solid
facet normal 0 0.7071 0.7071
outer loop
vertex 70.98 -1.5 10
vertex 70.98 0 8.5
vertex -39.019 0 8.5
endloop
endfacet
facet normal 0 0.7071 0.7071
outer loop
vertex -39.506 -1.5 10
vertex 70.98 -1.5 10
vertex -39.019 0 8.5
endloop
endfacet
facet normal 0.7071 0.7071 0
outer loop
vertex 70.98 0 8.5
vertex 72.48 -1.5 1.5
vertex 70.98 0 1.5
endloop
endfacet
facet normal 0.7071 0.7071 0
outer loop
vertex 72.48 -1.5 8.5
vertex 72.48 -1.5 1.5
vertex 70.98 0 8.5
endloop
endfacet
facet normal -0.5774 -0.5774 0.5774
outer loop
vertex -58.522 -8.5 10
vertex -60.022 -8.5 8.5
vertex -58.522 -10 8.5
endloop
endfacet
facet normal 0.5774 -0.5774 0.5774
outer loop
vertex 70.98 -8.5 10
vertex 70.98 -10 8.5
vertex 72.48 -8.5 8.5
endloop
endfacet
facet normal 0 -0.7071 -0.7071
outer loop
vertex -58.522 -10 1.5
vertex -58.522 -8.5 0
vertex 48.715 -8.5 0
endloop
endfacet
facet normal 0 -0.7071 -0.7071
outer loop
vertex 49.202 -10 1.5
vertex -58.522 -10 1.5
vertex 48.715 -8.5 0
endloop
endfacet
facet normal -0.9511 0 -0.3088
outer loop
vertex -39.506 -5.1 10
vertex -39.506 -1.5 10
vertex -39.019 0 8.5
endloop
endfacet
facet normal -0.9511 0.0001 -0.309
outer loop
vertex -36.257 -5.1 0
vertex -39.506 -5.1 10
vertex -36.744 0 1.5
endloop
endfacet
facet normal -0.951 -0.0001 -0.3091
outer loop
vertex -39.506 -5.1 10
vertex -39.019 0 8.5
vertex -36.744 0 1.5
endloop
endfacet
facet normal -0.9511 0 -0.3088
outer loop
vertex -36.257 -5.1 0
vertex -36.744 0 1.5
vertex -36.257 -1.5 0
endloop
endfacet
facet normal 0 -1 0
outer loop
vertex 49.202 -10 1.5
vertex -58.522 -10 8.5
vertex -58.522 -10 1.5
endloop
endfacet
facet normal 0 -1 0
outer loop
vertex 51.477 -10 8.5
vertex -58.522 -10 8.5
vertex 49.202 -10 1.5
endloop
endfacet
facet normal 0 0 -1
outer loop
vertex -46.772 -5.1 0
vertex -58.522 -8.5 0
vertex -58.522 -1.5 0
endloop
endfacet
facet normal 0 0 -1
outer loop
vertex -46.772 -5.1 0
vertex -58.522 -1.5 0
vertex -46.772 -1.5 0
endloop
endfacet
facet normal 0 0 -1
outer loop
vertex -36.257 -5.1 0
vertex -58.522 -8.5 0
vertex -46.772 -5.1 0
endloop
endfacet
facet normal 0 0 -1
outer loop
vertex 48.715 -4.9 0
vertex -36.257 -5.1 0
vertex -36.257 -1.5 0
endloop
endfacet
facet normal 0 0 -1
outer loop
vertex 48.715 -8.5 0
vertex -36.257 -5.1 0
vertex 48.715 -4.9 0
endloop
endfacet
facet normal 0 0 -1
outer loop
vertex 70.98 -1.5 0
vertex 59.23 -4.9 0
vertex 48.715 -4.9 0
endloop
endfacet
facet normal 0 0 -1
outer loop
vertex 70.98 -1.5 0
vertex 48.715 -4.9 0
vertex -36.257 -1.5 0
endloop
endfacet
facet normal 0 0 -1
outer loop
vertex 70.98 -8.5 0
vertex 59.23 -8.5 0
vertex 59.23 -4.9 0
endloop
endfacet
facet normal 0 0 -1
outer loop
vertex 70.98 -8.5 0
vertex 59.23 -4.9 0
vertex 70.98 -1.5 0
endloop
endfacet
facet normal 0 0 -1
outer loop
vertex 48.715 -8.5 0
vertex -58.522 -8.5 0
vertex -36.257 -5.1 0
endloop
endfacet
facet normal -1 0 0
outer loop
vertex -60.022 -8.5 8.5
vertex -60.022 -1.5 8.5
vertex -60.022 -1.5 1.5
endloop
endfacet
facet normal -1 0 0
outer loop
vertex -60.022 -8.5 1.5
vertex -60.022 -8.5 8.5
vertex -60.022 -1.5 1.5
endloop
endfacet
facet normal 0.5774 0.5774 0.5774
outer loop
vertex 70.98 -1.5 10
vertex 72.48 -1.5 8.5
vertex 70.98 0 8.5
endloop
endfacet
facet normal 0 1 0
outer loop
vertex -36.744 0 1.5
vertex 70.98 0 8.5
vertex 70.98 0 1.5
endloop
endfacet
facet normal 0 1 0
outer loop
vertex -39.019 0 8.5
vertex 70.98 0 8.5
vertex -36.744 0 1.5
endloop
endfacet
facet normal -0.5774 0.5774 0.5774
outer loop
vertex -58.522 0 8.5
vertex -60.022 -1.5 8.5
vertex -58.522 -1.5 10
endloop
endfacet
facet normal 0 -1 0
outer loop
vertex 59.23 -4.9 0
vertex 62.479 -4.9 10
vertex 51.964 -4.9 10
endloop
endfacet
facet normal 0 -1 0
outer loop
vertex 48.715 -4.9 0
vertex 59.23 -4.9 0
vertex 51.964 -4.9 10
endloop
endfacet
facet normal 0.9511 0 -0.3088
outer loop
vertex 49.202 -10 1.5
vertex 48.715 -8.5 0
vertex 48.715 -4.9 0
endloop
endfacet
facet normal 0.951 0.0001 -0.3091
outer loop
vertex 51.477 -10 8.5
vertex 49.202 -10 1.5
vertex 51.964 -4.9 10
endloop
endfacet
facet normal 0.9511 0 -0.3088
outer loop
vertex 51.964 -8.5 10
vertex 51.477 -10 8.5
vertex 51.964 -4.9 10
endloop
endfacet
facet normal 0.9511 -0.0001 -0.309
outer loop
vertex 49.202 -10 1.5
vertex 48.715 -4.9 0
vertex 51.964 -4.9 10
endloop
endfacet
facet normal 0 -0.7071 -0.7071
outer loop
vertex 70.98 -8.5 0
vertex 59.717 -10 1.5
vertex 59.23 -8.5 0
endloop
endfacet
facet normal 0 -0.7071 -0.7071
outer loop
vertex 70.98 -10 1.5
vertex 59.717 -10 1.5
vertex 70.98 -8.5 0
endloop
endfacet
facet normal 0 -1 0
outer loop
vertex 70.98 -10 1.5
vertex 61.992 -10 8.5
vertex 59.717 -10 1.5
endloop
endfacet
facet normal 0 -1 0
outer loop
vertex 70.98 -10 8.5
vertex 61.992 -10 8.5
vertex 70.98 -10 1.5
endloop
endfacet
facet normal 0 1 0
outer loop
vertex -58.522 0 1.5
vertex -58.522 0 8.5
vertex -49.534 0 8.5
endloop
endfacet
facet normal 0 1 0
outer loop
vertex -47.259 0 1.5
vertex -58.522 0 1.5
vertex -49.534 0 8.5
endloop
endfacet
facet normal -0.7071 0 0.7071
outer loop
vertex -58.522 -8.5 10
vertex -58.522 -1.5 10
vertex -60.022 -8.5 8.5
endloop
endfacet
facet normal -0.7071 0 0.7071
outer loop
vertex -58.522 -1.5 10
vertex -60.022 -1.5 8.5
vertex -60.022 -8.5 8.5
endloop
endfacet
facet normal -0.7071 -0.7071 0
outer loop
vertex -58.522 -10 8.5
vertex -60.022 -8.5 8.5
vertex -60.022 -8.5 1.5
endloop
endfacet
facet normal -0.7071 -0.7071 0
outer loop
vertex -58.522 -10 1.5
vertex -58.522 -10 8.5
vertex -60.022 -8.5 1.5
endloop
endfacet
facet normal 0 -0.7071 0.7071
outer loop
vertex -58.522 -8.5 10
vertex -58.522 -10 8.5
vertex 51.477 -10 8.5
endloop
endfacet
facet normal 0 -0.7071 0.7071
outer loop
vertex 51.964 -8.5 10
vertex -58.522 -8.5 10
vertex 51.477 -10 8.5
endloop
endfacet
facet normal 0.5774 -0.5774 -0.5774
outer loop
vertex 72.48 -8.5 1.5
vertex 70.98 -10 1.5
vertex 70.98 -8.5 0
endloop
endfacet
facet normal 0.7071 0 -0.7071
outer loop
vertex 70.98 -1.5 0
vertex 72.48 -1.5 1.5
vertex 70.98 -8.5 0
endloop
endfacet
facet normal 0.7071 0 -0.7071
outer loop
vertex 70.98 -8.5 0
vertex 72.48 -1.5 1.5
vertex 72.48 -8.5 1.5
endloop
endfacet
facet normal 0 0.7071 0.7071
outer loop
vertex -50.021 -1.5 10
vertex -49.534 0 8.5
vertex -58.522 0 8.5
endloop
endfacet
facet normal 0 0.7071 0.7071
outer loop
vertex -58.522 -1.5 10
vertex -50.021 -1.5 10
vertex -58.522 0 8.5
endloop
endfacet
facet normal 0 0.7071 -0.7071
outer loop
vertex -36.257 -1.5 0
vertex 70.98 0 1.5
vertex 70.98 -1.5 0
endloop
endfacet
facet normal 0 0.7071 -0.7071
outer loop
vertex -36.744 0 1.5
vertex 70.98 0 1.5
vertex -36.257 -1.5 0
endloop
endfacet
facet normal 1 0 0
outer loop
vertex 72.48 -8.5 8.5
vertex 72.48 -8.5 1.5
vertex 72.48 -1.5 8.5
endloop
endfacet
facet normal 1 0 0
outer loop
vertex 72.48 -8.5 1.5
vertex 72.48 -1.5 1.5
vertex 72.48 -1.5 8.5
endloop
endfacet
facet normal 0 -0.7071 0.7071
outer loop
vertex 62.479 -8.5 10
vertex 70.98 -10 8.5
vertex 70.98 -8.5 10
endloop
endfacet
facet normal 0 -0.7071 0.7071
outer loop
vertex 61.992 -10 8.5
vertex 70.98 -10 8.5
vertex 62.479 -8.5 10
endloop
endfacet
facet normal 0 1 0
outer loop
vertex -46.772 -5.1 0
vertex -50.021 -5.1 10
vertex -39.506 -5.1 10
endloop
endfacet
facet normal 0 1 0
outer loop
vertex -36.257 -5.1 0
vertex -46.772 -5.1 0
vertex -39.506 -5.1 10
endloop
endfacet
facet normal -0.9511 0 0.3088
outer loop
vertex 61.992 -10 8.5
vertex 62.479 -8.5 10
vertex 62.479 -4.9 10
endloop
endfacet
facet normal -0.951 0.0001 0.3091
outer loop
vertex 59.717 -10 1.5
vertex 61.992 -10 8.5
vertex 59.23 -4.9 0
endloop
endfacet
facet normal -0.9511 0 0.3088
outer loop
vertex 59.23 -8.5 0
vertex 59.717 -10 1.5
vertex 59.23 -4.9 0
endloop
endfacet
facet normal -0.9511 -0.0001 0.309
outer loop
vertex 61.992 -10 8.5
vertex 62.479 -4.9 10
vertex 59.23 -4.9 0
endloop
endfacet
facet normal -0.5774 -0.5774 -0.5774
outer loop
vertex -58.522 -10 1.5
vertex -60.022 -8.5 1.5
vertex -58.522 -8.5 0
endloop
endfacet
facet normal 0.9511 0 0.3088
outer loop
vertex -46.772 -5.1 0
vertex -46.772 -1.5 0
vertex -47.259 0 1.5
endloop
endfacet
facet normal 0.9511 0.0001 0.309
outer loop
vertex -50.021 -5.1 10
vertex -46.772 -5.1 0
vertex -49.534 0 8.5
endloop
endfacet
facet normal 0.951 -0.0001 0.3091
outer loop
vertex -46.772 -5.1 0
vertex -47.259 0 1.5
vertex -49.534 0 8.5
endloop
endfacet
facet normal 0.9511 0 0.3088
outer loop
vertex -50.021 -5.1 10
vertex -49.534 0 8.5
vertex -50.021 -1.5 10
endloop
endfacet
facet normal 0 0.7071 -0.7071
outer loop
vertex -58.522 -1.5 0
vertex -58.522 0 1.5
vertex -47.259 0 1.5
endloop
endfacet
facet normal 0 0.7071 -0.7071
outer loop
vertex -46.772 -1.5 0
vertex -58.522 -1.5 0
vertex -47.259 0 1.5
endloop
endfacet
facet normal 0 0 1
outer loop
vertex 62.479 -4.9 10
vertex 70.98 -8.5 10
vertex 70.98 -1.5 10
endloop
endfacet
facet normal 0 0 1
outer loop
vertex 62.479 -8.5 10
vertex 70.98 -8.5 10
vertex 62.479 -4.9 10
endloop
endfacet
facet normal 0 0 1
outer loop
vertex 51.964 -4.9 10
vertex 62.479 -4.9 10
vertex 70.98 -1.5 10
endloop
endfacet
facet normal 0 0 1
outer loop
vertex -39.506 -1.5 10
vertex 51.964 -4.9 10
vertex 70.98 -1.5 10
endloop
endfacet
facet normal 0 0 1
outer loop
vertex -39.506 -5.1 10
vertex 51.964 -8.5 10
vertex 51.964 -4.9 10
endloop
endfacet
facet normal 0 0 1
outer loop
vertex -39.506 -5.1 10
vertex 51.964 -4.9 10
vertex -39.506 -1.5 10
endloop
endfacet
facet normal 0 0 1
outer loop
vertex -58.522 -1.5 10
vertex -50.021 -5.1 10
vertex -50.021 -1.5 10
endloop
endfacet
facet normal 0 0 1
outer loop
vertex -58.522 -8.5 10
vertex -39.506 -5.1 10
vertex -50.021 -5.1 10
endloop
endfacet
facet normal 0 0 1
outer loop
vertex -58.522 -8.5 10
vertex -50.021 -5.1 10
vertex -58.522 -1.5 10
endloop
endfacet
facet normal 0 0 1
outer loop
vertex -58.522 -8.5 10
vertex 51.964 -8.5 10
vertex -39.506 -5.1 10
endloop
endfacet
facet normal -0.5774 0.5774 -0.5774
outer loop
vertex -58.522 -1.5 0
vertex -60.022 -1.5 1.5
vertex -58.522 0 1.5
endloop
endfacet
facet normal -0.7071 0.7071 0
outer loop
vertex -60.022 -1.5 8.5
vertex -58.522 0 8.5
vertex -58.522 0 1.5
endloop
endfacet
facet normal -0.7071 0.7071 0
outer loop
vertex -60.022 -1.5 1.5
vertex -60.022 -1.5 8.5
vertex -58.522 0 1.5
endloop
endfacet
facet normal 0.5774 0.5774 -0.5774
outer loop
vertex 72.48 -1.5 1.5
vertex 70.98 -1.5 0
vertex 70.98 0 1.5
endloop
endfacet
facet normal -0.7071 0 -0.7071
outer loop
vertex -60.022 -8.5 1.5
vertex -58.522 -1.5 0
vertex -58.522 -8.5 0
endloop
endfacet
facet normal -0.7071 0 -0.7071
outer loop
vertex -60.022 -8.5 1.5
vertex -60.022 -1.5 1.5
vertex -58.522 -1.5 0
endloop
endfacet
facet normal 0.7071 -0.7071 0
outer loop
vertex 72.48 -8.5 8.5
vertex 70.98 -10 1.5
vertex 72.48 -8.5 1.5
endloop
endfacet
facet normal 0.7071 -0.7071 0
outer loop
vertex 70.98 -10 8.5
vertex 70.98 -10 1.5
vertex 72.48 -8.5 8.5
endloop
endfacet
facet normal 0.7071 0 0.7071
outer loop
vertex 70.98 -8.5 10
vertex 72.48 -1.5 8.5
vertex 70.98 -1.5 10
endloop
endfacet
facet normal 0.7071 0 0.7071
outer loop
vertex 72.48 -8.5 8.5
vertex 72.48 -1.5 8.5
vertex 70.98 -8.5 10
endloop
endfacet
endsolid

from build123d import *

# Parameters (mm, degrees)
F1_DEPTH = 10
F3_DEPTH = 4.9
F5_DEPTH = 4.9
F6_SIZE  = 1.5


with BuildPart() as f1:
    # F0 (on Front) → F1 (new body)
    with BuildSketch(Plane.XZ):
        Polygon((-60.0217013935, 10), (-60.0217013935, 0), (-46.7717013935, 0), (-50.0208983558, 10), align=None)
    extrude(amount=F1_DEPTH)



with BuildPart() as f1b:
    # F0 (on Front) → F1, piece 2 (new body)
    with BuildSketch(Plane.XZ):
        Polygon((-39.5058983558, 10), (-36.2567013935, 0), (48.7149046818, 0), (51.9641016442, 10), align=None)
    extrude(amount=F1_DEPTH)



with BuildPart() as f1c:
    # F0 (on Front) → F1, piece 3 (new body)
    with BuildSketch(Plane.XZ):
        Polygon((62.4791016442, 10), (59.2299046818, 0), (72.4799046818, 0), (72.4799046818, 10), align=None)
    extrude(amount=F1_DEPTH)


with BuildPart() as f1b_1:
    add(f1b.part)

    add(f1c.part)  # F3 merges F1c
    # F2 (on face) → F3 (join)
    with BuildSketch(Plane(origin=(0, 0, 0), x_dir=(-1, 0, 0), z_dir=(0, 1, 0))):
        Polygon((-51.9641016442, 10), (-62.4791016442, 10), (-59.2299046818, 0), (-48.7149046818, 0), align=None)
    extrude(amount=-F3_DEPTH)


with BuildPart() as f1_1:
    add(f1.part)

    add(f1b_1.part)  # F5 merges F1b
    # F4 (on face) → F5 (join)
    with BuildSketch(Plane.XZ.offset(10)):
        Polygon((-39.5058983558, 10), (-50.0208983558, 10), (-46.7717013935, 0), (-36.2567013935, 0), align=None)
    extrude(amount=-F5_DEPTH)

    # F6
    f6_edges = [f1_1.edges().sort_by_distance(p)[0] for p in [
        (-60.021701, -5, 10),
        (-60.021701, -5, 0),
        (-60.021701, 0, 5),
        (-60.021701, -10, 5),
        (-55.0213, 0, 10),
        (-53.396701, 0, 0),
        (-5.653398, -10, 0),
        (-4.0288, -10, 10),
        (18.111602, 0, 0),
        (65.854905, -10, 0),
        (67.479503, -10, 10),
        (72.479905, -10, 5),
        (72.479905, -5, 0),
        (72.479905, 0, 5),
        (72.479905, -5, 10),
        (16.487003, 0, 10),
    ]]
    chamfer(f6_edges, length=F6_SIZE)


solid = f1_1.part
